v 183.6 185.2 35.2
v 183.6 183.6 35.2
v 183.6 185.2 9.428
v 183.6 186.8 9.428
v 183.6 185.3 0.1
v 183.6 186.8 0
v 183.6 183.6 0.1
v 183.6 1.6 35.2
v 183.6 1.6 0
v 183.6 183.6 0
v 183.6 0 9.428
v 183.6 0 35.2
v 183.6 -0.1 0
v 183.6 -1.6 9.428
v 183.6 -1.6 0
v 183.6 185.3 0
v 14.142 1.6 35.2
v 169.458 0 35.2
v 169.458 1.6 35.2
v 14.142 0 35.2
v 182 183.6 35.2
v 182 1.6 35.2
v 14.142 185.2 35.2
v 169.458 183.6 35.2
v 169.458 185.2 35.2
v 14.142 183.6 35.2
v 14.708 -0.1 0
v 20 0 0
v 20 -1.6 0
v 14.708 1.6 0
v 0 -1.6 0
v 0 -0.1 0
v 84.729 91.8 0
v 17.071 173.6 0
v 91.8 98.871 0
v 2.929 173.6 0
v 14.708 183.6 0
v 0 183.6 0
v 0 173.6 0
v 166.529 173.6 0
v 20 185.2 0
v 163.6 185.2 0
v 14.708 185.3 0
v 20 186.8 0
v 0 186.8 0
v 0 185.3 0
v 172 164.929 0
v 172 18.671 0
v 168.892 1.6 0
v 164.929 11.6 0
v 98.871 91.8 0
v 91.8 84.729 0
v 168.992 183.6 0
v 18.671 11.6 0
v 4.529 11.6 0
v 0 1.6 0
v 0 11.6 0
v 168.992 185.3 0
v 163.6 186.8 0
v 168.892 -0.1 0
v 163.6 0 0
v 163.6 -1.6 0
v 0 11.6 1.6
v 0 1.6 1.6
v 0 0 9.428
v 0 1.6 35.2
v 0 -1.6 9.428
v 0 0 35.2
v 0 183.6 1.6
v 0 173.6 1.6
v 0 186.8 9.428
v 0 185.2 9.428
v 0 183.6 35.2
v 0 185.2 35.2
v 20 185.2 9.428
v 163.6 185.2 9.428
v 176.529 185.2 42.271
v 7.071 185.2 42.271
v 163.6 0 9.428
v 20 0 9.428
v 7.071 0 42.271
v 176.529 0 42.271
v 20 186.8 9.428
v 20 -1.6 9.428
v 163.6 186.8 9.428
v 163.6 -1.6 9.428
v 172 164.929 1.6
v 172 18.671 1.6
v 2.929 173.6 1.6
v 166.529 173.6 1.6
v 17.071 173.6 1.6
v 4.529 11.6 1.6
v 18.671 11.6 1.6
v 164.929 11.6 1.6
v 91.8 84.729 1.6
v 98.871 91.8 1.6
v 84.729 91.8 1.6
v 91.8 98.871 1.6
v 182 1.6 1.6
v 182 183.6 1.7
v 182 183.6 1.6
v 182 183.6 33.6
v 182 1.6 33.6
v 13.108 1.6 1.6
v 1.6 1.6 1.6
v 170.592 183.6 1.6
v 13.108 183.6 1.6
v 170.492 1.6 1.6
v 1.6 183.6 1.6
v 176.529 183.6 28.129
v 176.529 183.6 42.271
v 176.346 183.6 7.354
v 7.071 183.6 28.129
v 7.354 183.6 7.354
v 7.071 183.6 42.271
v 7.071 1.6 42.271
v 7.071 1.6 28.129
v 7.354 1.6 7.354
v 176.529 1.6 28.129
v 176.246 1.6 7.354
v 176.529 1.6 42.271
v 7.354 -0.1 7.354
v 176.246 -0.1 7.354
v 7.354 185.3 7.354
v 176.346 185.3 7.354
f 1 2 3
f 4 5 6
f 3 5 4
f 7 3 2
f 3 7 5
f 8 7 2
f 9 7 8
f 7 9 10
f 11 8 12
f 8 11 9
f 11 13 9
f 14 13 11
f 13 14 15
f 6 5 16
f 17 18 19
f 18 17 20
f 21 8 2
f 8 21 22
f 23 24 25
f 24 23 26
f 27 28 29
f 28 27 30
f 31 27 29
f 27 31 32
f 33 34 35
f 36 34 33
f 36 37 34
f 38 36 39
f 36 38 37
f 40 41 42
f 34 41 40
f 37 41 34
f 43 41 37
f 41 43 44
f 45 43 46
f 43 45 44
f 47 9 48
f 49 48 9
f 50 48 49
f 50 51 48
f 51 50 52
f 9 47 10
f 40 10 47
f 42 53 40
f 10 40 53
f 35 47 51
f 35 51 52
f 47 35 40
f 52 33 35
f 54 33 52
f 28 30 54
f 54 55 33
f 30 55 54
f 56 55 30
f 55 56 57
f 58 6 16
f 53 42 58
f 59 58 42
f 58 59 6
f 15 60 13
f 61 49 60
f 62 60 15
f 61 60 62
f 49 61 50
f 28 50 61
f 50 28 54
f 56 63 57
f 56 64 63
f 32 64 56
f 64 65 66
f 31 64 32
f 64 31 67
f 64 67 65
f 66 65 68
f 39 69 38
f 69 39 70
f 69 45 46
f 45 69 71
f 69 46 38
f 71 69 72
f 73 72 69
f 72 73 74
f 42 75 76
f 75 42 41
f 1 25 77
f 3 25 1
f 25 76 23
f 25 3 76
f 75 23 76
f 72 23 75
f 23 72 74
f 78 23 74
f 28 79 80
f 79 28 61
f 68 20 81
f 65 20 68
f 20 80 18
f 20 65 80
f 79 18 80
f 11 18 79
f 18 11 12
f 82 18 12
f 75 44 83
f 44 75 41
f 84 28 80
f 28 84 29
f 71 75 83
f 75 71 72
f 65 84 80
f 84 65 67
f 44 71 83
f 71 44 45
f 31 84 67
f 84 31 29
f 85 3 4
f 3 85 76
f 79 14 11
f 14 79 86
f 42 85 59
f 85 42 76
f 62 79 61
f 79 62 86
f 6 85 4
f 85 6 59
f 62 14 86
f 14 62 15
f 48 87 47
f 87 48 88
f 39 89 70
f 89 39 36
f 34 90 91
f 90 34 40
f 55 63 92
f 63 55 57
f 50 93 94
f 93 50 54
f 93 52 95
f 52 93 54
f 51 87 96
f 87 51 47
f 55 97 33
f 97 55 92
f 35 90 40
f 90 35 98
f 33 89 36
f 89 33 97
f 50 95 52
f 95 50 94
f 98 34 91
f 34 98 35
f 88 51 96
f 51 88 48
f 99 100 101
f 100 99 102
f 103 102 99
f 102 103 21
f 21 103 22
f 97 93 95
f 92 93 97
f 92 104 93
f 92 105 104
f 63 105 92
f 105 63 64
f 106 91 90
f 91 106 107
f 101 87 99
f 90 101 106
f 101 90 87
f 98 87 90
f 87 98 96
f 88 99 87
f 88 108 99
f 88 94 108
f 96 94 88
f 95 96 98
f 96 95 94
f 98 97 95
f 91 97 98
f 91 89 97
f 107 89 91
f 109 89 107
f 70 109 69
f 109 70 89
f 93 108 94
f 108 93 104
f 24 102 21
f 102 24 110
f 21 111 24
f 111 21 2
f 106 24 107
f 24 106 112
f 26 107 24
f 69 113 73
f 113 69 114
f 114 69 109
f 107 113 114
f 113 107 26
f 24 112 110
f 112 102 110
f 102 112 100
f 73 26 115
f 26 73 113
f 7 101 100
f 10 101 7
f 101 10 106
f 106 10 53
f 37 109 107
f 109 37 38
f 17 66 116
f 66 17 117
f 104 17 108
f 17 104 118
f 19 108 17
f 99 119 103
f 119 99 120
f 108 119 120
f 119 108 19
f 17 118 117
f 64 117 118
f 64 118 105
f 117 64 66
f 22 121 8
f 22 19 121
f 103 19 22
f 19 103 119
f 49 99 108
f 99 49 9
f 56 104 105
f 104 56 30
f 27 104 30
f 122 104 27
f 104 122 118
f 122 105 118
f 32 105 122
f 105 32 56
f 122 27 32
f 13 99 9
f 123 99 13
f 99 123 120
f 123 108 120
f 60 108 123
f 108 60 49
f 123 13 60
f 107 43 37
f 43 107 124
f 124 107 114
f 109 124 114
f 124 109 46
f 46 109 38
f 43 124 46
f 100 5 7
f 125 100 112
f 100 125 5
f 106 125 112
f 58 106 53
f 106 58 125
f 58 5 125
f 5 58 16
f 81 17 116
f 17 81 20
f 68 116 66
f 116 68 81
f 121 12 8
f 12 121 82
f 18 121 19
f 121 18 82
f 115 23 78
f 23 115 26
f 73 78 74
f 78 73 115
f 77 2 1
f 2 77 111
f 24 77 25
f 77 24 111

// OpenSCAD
$fa=4; // default minimum facet angle is now 0.5
$fs=0.05; // default minimum facet size is now 0.05 mm

tolerance = .2;
unit = 20;
wallThickness = 1.6;
drawerWallThickness = .8;
barWidth = 10;

internalHeight = 32;

handleHeight = 5;

xUnits = 9;
yUnits = 9;

interiorXDimension = tol(xUnits * unit + drawerWallThickness * 2, -2);
interiorYDimension = tol(yUnits * unit + drawerWallThickness * 2, -2);

exteriorXDimension = interiorXDimension + wallThickness;
exteriorYDimension = interiorYDimension + wallThickness * 2;

union() {
  difference() {
    union() {
      cube([exteriorXDimension, exteriorYDimension, internalHeight + 2 * wallThickness]);
      translate([0, -wallThickness, 0]) cube([barWidth * 2, exteriorYDimension + 2 * wallThickness, diag(barWidth, barWidth) / 3 * 2]);
      translate([exteriorXDimension - barWidth * 2, -wallThickness, 0]) cube([barWidth * 2, exteriorYDimension + 2 * wallThickness, diag(barWidth, barWidth) / 3 * 2]);
    }
    translate([-.1, wallThickness, wallThickness]) cube([interiorXDimension + .1, interiorYDimension, internalHeight + 2 * wallThickness]);

    translate([0, -.1, 0]) rotate([0, 45, 0]) cube([tol(barWidth, -2), wallThickness + .1, tol(barWidth, -2)]);
    translate([exteriorXDimension - diag(tol(barWidth, -2), tol(barWidth, -2)), -.1, 0]) rotate([0, 45, 0]) cube([tol(barWidth, -2), wallThickness + .1, tol(barWidth, -2)]);
    translate([0, exteriorYDimension - wallThickness, 0]) rotate([0, 45, 0]) cube([tol(barWidth, -2), wallThickness + .1, tol(barWidth, -2)]);
    translate([exteriorXDimension - diag(tol(barWidth, -2), tol(barWidth, -2)) + .1, exteriorYDimension - wallThickness, 0]) rotate([0, 45, 0]) cube([tol(barWidth, -2), wallThickness + .1, tol(barWidth, -2)]);

    intersection() {
      barAngle = atan(xUnits / yUnits);

      translate([- .1, barWidth + wallThickness, internalHeight / -2]) cube([interiorXDimension - barWidth + .1, interiorYDimension - 2 * barWidth, 2 * internalHeight]);
      difference() {
        translate([- .1, barWidth + wallThickness, internalHeight / -2]) cube([interiorXDimension - barWidth + .1, interiorYDimension - 2 * barWidth, 2 * internalHeight]);
        rotate([0, 0, -barAngle]) translate([-barWidth / 2, 0, internalHeight / -2]) cube([barWidth, diag(interiorXDimension, interiorYDimension), 2 * internalHeight]);
        translate([exteriorXDimension, 0, 0]) rotate([0, 0, barAngle]) translate([-barWidth / 2, 0, internalHeight / -2]) cube([barWidth, diag(interiorXDimension, interiorYDimension), 2 * internalHeight]);
      }
    }
  }

  translate([0, 0, internalHeight + 2 * wallThickness]) rotate([0, 45, 0]) cube([barWidth, wallThickness, barWidth]);
  translate([exteriorXDimension - diag(barWidth, barWidth), 0, internalHeight + 2 * wallThickness]) rotate([0, 45, 0]) cube([barWidth, wallThickness, barWidth]);
  translate([0, exteriorYDimension - wallThickness, internalHeight + 2 * wallThickness]) rotate([0, 45, 0]) cube([barWidth, wallThickness, barWidth]);
  translate([exteriorXDimension - diag(barWidth, barWidth), exteriorYDimension - wallThickness, internalHeight + 2 * wallThickness]) rotate([0, 45, 0]) cube([barWidth, wallThickness, barWidth]);
}


function tol(value, m = 1) = value - (m * tolerance);

function diag(x, y) = sqrt(x * x + y * y);
